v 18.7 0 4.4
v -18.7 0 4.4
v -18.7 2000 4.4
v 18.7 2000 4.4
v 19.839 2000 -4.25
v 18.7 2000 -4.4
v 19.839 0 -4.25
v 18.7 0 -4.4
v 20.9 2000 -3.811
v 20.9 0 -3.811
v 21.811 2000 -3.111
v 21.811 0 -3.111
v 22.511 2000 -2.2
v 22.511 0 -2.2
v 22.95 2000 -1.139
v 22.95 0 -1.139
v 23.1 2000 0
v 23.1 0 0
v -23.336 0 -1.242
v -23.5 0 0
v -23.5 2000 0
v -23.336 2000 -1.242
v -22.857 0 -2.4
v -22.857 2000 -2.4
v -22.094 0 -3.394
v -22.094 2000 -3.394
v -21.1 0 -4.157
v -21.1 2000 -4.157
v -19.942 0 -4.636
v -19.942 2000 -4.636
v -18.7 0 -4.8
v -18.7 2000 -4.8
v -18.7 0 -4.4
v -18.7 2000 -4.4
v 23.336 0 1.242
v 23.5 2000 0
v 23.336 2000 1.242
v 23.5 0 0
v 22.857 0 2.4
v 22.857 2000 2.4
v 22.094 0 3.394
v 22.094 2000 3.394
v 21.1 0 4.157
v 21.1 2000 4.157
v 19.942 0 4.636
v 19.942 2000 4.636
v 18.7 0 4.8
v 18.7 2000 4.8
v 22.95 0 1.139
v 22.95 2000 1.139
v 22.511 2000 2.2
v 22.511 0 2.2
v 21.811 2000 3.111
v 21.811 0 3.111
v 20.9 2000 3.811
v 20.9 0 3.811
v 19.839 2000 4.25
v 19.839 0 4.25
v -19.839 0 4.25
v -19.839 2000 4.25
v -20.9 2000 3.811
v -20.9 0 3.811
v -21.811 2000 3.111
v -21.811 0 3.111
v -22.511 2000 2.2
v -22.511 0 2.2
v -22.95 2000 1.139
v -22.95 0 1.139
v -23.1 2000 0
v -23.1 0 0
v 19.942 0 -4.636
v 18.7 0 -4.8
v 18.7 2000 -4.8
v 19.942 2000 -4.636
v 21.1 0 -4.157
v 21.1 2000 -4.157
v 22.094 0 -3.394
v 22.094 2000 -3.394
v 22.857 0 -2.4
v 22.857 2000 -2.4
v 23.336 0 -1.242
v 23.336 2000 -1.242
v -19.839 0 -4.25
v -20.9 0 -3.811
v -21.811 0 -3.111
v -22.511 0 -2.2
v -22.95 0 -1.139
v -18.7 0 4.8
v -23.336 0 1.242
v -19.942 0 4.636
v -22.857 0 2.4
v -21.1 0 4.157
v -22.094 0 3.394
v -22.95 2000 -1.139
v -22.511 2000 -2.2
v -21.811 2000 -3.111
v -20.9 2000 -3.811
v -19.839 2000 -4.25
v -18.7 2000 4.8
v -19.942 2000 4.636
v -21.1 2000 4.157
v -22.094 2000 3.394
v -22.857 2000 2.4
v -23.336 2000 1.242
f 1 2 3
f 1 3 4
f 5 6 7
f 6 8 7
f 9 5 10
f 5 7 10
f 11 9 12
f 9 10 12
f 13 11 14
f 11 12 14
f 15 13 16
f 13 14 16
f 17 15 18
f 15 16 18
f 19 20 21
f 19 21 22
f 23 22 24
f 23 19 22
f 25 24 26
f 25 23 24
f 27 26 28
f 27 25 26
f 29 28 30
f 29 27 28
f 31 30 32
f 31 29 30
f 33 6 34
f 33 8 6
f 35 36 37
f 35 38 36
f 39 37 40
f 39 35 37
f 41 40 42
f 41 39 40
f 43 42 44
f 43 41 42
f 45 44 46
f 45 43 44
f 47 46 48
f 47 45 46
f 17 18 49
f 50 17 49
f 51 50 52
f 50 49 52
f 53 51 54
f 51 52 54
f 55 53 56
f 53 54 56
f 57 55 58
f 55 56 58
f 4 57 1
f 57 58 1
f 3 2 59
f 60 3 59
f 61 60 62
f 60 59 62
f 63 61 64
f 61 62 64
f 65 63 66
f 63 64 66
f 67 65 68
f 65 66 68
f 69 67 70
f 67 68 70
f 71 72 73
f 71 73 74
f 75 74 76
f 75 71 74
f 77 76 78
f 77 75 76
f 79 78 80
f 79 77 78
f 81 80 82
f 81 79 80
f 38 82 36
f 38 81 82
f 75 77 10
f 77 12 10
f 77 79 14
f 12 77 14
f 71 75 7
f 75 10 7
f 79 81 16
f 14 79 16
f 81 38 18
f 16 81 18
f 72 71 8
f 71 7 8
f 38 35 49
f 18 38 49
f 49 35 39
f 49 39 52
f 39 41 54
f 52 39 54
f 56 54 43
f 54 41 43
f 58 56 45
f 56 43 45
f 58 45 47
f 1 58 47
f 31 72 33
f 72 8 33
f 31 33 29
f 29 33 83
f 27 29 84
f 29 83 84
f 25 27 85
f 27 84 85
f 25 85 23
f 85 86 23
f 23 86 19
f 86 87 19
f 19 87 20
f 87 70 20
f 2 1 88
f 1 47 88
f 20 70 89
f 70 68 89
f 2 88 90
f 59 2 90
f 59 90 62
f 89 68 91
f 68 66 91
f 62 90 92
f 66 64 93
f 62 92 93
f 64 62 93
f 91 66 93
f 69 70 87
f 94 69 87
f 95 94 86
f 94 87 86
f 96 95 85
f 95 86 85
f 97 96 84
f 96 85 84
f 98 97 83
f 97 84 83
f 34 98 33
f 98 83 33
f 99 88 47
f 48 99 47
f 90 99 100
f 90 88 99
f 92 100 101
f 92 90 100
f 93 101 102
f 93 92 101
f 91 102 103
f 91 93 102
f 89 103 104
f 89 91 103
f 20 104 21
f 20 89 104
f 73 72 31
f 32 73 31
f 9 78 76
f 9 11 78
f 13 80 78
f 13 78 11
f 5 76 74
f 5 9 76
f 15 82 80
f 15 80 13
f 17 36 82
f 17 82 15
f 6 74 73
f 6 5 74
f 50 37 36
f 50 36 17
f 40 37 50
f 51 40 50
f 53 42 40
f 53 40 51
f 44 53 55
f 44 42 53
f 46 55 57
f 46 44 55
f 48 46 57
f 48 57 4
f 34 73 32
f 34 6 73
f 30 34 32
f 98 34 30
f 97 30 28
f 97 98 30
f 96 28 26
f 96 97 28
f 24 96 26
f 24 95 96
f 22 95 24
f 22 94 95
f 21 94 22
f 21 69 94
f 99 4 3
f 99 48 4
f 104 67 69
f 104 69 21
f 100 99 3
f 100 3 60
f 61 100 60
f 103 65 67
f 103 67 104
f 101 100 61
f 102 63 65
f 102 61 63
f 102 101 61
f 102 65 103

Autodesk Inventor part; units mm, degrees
ref_plane "YZ Plane" through (0, 0, 0) normal (1, 0, 0) x (0, 1, 0)
ref_plane "XZ Plane" through (0, 0, 0) normal (0, 1, 0) x (-1, 0, 0)
ref_plane "XY Plane" through (0, 0, 0) normal (0, 0, 1) x (1, 0, 0)
sketch "Эскиз1" plane through (0, 0, 0) normal (0, 1, 0) x (-1, 0, 0)
  line L0 (18.7, 4.8) -> (-18.7, 4.8)
  line L1 (-23.5, 0) -> (-23.5, 0)
  line L2 (-18.7, -4.8) -> (18.7, -4.8)
  line L3 (23.5, 0) -> (23.5, 0)
  arc A0 (23.5, 0) -> (18.7, 4.8) centre (18.7, 0) ccw
  arc A1 (18.7, -4.8) -> (23.5, 0) centre (18.7, 0) ccw
  arc A2 (-18.7, 4.8) -> (-23.5, 0) centre (-18.7, 0) ccw
  arc A3 (-23.5, 0) -> (-18.7, -4.8) centre (-18.7, 0) ccw
  line L4 (18.7, 4.4) -> (-18.7, 4.4)
  line L5 (-23.1, 0) -> (-23.1, 0)
  line L6 (-18.7, -4.4) -> (18.7, -4.4)
  line L7 (23.1, 0) -> (23.1, 0)
  arc A4 (23.1, 0) -> (18.7, 4.4) centre (18.7, 0) ccw
  arc A5 (18.7, -4.4) -> (23.1, 0) centre (18.7, 0) ccw
  arc A6 (-23.1, 0) -> (-18.7, -4.4) centre (-18.7, 0) ccw
  arc A7 (-18.7, 4.4) -> (-23.1, 0) centre (-18.7, 0) ccw
  point P0 (0, 0)
  dimension "d0" = 4.8
  dimension "d1" = 4.8
  dimension "d2" = 47
  dimension "d3" = 23.5
  dimension "d4" = 4.8
  dimension "d5" = 4.4
  dimension "d6" = 4.4
  dimension "d7" = 23.1
  dimension "d8" = 23.1
  dimension "d9" = 4.4
extrude "Выдавливание1" add sketch "Эскиз1" along normal blind 2000
properties part number "isolation"
